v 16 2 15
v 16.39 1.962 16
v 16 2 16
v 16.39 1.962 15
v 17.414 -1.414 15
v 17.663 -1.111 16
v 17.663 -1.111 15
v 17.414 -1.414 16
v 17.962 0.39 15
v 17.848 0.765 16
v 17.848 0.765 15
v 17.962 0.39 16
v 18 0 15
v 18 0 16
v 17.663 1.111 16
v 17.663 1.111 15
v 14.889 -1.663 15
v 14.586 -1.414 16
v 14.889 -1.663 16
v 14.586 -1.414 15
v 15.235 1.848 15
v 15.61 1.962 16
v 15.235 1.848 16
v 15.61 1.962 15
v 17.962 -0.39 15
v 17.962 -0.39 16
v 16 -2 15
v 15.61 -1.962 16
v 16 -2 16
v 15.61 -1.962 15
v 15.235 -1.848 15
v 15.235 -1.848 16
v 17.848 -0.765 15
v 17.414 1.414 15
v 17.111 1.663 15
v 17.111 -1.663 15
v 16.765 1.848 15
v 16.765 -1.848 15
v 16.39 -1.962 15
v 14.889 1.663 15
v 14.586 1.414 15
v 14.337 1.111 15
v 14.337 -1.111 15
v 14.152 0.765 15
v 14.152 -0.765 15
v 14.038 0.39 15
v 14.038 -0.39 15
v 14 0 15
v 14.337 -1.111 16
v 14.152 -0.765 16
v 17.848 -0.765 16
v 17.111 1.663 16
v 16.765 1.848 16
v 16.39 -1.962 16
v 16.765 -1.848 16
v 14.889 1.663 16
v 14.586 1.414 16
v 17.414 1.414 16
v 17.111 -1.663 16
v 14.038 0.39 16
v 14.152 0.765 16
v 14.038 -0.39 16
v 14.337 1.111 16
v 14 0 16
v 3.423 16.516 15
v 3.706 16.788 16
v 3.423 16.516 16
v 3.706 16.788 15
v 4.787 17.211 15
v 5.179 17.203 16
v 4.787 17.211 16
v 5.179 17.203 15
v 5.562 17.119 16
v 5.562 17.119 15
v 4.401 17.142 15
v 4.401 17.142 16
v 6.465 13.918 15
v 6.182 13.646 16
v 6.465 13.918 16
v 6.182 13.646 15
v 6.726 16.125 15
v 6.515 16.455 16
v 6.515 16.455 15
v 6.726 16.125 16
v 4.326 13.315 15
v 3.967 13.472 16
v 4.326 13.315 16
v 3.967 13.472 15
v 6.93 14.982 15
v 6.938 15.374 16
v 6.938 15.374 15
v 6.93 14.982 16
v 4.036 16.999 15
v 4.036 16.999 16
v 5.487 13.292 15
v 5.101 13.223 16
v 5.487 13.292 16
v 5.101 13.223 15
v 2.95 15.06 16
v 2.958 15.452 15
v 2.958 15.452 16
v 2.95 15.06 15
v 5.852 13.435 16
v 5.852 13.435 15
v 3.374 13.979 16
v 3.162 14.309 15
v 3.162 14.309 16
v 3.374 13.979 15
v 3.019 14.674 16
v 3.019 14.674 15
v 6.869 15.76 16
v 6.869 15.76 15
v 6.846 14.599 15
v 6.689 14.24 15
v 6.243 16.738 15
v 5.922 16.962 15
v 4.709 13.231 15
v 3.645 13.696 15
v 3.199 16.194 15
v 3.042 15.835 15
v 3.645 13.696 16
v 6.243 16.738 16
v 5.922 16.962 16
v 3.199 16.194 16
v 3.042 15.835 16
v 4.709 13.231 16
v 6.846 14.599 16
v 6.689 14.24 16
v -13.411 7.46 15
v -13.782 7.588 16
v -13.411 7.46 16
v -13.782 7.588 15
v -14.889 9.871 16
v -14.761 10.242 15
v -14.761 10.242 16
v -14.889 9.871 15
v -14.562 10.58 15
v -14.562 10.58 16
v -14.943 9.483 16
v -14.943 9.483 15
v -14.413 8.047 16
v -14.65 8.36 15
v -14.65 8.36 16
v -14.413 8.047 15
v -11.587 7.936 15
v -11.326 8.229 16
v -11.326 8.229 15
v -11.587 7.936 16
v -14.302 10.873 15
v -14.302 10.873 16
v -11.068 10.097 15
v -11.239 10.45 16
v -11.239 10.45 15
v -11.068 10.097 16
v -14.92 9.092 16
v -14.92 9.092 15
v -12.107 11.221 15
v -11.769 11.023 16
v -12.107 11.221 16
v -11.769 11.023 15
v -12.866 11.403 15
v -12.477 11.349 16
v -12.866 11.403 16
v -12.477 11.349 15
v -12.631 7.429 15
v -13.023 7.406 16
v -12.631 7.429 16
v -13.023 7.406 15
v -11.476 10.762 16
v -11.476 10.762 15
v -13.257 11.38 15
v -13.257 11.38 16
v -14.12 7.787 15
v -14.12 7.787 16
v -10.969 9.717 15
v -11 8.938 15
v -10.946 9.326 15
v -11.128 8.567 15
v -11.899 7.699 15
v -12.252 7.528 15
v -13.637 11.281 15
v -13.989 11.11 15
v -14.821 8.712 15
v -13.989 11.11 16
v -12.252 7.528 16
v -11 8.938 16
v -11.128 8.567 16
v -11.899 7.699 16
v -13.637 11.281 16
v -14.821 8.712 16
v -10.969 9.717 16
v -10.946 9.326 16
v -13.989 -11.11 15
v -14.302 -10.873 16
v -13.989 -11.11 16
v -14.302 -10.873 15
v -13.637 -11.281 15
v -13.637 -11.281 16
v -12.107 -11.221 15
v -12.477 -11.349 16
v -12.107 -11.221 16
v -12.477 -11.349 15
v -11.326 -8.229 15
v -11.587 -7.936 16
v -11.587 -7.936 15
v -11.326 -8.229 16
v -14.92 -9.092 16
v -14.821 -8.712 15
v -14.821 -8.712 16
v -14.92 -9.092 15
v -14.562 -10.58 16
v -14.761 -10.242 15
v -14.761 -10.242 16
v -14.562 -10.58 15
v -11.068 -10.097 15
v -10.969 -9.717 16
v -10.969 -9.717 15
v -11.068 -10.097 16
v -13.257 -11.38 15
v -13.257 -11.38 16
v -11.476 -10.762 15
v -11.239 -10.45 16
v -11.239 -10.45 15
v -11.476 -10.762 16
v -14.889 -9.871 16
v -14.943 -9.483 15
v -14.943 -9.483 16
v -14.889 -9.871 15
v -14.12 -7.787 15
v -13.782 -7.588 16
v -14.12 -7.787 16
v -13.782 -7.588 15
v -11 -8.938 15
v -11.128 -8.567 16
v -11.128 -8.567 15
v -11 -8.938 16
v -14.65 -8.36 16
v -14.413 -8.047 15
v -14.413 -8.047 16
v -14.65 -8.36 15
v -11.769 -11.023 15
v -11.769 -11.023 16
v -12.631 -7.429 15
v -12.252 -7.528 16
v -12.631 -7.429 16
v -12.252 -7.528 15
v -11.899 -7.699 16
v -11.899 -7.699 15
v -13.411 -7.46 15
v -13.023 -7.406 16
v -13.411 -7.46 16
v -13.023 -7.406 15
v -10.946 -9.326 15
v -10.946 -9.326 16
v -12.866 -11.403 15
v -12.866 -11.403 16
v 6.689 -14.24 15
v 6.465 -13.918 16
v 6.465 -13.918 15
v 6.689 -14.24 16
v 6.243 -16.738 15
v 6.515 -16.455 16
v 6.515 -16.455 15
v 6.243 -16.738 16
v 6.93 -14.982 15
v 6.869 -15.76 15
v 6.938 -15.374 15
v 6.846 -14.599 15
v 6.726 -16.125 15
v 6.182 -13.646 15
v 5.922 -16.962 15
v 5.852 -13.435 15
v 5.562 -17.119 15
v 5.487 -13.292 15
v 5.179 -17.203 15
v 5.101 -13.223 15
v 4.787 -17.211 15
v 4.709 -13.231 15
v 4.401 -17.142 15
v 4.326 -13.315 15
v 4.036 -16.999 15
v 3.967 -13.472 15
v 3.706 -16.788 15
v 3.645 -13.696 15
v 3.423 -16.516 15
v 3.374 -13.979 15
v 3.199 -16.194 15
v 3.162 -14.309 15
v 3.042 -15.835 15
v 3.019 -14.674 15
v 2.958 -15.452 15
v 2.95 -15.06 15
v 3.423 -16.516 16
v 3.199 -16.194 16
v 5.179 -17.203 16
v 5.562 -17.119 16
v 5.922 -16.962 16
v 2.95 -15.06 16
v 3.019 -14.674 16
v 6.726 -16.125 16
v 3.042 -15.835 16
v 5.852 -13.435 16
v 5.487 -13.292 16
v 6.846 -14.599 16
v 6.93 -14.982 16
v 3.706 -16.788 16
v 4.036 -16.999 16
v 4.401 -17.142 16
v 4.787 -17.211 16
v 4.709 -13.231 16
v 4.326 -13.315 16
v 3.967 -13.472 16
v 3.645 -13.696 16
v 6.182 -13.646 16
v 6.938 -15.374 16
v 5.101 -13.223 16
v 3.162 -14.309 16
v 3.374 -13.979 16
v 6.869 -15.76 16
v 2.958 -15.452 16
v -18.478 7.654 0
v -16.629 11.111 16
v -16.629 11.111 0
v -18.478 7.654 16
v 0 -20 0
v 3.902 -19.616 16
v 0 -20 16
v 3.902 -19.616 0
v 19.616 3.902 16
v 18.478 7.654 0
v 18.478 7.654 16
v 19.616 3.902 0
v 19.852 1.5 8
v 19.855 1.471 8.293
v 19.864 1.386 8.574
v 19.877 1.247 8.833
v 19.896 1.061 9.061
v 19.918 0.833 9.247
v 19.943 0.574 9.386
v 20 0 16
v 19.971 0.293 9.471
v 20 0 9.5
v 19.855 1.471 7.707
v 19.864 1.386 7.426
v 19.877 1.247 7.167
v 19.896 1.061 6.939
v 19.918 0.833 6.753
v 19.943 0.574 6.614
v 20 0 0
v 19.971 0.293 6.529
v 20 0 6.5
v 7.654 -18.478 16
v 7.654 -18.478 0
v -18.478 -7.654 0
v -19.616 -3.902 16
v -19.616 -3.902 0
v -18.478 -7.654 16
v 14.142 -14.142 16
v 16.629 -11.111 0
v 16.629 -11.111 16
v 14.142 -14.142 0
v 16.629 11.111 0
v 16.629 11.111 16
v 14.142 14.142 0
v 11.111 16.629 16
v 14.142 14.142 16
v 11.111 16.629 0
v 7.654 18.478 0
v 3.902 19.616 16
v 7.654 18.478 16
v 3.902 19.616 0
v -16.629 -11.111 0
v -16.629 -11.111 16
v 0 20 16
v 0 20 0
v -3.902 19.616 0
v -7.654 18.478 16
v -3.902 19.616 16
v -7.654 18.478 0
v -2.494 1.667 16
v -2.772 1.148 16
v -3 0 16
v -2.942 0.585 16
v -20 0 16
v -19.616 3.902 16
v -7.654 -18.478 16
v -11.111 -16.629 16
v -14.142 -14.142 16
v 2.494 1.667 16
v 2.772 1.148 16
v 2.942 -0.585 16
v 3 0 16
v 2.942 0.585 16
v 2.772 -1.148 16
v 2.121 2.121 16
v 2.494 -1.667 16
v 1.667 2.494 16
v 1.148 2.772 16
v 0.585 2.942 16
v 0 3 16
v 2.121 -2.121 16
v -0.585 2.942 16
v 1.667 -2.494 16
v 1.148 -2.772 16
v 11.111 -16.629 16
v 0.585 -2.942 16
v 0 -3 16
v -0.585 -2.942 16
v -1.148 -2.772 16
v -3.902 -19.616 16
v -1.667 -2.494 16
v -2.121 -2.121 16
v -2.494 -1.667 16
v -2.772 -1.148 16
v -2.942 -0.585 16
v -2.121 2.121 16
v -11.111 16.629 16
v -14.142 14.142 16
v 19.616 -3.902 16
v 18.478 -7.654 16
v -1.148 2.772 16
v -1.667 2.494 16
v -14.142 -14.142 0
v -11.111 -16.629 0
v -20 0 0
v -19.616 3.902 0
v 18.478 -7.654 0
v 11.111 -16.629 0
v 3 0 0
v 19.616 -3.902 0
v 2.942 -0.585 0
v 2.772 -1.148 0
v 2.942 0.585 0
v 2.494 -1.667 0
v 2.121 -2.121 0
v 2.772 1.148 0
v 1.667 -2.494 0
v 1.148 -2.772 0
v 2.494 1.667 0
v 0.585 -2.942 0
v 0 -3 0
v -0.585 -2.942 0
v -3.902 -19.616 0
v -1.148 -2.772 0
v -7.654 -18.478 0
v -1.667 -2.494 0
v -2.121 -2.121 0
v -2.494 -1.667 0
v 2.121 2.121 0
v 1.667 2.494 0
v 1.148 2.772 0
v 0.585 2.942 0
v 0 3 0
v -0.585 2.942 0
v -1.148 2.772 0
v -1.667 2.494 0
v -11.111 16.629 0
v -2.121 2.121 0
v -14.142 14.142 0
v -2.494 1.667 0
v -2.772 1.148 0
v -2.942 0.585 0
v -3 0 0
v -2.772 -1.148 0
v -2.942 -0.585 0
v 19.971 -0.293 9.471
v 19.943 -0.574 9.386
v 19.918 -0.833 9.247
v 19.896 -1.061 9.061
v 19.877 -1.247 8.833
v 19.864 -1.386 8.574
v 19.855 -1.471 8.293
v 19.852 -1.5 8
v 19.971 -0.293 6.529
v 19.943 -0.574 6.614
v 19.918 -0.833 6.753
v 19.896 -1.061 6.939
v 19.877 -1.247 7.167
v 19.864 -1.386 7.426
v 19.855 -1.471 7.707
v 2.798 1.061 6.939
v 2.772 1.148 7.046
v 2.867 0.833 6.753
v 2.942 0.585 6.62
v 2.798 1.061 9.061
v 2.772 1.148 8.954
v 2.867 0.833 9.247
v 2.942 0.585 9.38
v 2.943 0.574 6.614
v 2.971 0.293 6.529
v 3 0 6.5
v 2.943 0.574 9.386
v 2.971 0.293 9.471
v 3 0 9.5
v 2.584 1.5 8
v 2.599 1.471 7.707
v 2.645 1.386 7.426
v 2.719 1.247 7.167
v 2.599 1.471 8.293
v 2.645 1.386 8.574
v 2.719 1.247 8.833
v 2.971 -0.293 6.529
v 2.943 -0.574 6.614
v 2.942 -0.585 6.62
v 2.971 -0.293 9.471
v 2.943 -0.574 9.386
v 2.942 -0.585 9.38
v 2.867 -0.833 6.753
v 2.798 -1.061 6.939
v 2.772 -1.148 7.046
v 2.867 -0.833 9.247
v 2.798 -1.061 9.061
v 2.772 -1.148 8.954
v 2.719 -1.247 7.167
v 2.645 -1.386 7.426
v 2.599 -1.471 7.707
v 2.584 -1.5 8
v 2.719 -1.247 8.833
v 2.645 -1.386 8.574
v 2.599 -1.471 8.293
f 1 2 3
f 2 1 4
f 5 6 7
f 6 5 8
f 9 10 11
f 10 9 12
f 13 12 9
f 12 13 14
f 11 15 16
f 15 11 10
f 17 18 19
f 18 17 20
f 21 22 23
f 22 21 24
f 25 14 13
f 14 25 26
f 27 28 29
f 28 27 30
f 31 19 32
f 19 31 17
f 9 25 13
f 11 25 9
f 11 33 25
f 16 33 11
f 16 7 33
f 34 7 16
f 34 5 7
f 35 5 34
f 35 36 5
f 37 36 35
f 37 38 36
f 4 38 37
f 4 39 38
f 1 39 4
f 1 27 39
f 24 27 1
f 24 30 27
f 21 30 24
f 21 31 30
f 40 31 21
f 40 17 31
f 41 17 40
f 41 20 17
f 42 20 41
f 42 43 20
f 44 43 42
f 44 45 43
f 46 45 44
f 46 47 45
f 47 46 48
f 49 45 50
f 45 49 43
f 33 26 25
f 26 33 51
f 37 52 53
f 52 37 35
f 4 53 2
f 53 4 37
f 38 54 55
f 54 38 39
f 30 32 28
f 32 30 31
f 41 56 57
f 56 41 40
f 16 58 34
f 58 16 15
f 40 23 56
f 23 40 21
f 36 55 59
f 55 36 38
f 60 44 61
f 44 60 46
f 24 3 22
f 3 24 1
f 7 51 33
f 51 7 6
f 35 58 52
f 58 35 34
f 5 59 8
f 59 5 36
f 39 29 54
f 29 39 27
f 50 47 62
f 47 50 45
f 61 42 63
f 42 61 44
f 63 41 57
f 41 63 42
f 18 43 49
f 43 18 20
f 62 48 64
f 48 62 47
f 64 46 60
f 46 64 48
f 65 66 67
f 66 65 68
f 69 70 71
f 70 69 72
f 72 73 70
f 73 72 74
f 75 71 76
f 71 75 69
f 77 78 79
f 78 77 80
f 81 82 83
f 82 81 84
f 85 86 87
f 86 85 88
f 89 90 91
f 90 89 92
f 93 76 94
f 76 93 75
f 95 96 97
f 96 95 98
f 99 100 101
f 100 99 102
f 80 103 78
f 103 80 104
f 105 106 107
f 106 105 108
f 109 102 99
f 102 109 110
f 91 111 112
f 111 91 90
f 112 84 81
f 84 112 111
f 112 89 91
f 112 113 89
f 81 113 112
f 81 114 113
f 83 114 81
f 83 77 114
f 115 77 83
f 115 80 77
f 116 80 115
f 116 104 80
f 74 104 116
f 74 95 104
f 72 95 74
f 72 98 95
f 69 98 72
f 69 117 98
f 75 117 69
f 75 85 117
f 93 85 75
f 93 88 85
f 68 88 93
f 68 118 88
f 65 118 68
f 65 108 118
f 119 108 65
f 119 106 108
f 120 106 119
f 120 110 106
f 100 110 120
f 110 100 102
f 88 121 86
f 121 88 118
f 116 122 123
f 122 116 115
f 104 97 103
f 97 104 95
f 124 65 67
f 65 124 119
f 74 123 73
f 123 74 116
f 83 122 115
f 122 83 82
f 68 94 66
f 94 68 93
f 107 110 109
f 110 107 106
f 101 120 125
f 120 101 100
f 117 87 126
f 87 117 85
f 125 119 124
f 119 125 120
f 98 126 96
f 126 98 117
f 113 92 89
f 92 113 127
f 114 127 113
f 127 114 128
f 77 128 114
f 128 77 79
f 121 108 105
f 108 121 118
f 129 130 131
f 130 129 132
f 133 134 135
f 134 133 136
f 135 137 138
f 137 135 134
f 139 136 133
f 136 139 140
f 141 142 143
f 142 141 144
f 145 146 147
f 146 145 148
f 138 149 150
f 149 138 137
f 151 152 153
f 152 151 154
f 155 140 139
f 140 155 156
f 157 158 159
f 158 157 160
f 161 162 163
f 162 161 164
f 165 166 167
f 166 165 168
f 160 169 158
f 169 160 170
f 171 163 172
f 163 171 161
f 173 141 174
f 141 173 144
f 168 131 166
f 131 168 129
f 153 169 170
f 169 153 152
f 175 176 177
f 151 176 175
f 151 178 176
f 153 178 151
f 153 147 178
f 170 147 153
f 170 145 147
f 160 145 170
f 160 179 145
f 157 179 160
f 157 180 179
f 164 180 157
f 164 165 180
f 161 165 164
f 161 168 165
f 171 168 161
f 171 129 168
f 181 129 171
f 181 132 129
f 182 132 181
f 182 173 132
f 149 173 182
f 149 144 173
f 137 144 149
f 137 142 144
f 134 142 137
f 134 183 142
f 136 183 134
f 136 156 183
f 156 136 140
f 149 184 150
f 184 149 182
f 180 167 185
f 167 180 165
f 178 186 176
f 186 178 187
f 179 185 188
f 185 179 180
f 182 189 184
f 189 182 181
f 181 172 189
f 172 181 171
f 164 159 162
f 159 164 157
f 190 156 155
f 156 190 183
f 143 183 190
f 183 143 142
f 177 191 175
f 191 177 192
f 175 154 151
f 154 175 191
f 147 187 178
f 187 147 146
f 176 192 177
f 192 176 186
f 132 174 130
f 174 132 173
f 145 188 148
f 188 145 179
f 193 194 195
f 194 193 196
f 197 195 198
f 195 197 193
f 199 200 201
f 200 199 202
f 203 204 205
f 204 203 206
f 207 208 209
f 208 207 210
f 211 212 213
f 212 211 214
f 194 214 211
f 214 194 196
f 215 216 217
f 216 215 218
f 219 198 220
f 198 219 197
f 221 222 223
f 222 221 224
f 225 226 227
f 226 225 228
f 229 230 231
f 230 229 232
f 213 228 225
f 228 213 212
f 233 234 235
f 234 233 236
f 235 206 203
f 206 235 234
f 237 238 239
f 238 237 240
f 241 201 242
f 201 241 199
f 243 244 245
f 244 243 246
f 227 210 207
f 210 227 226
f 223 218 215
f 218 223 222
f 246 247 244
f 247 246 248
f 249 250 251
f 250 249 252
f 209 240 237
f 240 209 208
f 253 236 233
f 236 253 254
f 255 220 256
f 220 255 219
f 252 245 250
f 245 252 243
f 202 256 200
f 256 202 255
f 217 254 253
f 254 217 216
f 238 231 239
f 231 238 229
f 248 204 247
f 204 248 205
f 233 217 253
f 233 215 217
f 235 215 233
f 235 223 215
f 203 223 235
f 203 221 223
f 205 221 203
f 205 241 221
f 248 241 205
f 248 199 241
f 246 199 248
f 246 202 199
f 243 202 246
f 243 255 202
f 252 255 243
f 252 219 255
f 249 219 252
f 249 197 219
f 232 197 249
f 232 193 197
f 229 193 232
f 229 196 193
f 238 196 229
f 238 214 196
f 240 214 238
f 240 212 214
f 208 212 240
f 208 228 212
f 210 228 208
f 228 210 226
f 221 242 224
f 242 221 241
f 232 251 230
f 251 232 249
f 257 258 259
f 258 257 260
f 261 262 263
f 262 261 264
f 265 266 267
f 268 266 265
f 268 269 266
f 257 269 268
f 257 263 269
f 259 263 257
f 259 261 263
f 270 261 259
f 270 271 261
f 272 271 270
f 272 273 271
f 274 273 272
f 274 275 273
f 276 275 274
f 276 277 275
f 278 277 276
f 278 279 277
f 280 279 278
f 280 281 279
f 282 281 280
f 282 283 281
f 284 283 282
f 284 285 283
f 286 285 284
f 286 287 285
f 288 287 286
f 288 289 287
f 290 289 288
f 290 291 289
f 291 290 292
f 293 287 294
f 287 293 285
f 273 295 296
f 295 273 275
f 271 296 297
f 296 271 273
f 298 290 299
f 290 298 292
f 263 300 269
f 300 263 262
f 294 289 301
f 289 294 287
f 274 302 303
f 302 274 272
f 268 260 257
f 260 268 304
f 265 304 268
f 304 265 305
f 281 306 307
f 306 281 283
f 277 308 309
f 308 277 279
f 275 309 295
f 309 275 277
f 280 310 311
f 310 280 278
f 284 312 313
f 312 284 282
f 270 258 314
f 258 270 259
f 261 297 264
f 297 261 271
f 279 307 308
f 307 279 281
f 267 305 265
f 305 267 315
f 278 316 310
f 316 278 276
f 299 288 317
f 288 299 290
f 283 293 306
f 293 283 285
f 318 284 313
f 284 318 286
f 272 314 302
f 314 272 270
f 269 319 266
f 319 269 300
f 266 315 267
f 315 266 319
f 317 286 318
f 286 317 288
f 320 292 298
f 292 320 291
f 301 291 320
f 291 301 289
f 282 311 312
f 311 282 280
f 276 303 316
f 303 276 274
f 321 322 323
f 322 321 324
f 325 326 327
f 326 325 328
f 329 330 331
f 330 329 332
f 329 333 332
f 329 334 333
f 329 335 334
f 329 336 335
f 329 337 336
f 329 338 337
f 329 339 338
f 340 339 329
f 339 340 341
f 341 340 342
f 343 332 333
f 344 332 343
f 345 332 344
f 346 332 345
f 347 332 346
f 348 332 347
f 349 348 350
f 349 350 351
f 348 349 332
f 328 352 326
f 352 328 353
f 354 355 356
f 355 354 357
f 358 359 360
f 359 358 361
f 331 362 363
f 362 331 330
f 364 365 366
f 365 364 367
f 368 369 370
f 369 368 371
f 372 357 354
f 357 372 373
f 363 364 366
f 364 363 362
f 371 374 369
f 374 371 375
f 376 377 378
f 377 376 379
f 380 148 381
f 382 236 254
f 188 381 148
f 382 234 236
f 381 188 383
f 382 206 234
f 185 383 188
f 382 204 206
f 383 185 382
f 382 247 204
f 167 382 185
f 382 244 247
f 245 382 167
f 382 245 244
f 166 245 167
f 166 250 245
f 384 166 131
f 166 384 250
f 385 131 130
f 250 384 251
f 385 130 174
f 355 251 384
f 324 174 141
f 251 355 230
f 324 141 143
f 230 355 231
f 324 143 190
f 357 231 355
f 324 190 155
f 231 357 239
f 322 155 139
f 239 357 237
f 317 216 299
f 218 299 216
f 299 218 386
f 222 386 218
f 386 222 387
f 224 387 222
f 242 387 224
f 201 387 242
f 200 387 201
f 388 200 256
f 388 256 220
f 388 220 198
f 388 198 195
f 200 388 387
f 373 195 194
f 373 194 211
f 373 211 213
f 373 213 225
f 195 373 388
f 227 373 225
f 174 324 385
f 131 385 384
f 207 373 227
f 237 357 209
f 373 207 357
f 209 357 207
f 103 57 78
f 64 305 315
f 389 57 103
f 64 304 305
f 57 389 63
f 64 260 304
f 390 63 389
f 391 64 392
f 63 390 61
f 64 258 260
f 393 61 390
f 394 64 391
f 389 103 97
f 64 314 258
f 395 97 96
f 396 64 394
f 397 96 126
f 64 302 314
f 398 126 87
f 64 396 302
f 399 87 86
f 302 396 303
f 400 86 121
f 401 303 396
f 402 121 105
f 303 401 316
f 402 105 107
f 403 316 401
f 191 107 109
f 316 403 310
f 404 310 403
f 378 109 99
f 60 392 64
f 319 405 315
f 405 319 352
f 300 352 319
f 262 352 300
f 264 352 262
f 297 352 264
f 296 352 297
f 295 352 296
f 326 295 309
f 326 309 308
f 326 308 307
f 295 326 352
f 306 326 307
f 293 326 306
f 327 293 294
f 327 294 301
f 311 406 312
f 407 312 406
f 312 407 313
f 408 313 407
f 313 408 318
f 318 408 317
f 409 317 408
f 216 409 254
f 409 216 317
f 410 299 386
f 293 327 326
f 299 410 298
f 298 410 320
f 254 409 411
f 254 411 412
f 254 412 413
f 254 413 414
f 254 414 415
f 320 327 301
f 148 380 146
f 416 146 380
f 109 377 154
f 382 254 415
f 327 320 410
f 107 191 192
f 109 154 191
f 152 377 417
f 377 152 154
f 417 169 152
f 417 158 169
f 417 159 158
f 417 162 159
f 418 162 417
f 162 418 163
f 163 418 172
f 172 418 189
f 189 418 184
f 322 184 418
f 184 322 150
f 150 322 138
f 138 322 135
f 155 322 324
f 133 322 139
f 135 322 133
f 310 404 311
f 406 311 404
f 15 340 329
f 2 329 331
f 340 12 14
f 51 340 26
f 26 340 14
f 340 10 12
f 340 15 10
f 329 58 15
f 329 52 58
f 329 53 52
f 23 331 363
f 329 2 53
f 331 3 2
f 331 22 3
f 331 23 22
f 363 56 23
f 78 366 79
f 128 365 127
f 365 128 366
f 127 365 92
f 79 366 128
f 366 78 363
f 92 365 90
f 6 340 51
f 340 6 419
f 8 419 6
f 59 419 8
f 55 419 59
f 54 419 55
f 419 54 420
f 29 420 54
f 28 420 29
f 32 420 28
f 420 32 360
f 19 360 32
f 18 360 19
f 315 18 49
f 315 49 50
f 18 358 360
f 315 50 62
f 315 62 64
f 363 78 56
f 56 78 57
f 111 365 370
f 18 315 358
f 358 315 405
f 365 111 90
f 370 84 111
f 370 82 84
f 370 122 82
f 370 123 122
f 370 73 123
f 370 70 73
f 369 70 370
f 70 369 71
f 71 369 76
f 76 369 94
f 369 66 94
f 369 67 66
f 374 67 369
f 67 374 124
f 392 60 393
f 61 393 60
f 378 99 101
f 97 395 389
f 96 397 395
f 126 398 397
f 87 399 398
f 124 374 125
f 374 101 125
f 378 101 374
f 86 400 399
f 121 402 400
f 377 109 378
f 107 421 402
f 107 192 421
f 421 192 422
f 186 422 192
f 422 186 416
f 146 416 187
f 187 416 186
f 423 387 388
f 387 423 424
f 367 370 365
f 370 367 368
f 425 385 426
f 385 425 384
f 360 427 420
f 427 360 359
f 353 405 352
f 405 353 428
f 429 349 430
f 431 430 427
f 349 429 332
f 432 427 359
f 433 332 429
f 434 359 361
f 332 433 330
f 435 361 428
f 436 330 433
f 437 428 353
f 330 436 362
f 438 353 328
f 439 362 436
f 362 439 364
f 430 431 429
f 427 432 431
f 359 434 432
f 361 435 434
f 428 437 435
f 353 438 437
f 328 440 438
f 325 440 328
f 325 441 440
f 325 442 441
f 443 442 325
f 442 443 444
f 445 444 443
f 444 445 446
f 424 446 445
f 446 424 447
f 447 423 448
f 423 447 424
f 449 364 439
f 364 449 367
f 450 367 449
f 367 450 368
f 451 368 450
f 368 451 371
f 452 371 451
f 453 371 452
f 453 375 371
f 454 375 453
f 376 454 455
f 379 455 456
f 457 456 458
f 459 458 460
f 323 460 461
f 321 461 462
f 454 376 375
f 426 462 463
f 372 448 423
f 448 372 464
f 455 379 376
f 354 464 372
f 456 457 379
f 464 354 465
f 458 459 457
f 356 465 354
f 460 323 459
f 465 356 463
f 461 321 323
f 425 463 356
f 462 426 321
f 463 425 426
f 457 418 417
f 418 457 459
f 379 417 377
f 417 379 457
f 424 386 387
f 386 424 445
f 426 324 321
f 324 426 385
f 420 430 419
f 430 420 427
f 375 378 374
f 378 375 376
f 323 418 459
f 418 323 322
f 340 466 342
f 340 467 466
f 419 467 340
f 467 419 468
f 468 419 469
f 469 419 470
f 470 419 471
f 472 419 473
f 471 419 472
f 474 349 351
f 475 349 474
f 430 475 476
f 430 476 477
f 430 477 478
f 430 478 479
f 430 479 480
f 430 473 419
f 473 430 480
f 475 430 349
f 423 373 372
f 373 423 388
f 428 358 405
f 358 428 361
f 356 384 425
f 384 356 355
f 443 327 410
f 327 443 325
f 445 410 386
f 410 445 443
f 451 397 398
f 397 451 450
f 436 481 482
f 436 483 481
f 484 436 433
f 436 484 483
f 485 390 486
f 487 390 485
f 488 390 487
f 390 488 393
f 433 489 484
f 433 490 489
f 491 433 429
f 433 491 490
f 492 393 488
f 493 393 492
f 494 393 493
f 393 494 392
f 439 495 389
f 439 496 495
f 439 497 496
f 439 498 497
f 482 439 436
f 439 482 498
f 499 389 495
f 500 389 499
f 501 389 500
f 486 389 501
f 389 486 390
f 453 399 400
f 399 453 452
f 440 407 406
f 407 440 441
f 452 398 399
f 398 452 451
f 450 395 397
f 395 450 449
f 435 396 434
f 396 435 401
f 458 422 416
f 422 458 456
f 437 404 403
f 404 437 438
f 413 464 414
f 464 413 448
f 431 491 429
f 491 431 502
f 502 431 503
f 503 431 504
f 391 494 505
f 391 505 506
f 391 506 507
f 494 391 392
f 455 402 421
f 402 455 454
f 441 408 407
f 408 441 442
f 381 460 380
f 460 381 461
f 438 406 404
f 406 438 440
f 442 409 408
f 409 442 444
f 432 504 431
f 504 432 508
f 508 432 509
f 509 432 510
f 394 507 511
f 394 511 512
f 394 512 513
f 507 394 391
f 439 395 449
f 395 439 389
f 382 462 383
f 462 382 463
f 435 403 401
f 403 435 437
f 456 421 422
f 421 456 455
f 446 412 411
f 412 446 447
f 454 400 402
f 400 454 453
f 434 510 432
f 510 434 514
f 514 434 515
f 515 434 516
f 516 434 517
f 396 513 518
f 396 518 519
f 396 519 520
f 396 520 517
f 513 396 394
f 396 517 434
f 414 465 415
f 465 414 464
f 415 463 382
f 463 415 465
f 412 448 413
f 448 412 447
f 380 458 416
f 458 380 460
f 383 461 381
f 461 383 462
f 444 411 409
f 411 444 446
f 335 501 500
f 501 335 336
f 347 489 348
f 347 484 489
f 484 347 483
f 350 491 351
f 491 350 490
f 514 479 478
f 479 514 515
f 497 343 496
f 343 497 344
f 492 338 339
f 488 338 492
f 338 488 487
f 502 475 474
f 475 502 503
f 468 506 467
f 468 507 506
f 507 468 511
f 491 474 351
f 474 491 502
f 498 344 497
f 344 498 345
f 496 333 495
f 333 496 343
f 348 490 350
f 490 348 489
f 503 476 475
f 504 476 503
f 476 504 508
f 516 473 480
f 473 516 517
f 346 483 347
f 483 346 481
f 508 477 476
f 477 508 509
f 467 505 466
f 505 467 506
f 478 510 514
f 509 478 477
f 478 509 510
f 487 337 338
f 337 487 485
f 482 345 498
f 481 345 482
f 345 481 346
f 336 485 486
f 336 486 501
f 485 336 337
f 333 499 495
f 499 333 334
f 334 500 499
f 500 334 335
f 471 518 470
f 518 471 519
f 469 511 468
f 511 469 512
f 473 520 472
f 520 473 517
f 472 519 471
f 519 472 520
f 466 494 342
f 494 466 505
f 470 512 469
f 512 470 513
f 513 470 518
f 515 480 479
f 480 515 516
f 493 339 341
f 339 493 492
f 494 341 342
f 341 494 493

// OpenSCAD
$fn = 32;

// ----------------------------------------------------------------------
// Control knob: dimpled knob
// ----------------------------------------------------------------------

// --- parameters (mm) ---
dimp_d = 4;               // finger dimple diameter
n_dimp = 5;               // number of dimples
dimp_r = 16;              // dimple ring radius
knob_d = 40;              // knob body diameter
knob_h = 16;              // knob body height
bore_d = 6;               // shaft bore diameter
set_d = 3;                // set screw bore diameter

dimp_step = 360 / n_dimp;  // dimple angular step

difference() {
  cylinder(h = knob_h, d = knob_d);
  translate([0, 0, -1]) cylinder(h = knob_h + 2, d = bore_d);
  translate([-1, 0, knob_h / 2]) rotate([0, 90, 0])
    cylinder(h = knob_d / 2 + bore_d / 2 + 2, d = set_d);  for (i = [0 : n_dimp - 1])
    rotate([0, 0, i * dimp_step])
      translate([dimp_r, 0, knob_h - 1])
        cylinder(h = 2, d = dimp_d);
}
